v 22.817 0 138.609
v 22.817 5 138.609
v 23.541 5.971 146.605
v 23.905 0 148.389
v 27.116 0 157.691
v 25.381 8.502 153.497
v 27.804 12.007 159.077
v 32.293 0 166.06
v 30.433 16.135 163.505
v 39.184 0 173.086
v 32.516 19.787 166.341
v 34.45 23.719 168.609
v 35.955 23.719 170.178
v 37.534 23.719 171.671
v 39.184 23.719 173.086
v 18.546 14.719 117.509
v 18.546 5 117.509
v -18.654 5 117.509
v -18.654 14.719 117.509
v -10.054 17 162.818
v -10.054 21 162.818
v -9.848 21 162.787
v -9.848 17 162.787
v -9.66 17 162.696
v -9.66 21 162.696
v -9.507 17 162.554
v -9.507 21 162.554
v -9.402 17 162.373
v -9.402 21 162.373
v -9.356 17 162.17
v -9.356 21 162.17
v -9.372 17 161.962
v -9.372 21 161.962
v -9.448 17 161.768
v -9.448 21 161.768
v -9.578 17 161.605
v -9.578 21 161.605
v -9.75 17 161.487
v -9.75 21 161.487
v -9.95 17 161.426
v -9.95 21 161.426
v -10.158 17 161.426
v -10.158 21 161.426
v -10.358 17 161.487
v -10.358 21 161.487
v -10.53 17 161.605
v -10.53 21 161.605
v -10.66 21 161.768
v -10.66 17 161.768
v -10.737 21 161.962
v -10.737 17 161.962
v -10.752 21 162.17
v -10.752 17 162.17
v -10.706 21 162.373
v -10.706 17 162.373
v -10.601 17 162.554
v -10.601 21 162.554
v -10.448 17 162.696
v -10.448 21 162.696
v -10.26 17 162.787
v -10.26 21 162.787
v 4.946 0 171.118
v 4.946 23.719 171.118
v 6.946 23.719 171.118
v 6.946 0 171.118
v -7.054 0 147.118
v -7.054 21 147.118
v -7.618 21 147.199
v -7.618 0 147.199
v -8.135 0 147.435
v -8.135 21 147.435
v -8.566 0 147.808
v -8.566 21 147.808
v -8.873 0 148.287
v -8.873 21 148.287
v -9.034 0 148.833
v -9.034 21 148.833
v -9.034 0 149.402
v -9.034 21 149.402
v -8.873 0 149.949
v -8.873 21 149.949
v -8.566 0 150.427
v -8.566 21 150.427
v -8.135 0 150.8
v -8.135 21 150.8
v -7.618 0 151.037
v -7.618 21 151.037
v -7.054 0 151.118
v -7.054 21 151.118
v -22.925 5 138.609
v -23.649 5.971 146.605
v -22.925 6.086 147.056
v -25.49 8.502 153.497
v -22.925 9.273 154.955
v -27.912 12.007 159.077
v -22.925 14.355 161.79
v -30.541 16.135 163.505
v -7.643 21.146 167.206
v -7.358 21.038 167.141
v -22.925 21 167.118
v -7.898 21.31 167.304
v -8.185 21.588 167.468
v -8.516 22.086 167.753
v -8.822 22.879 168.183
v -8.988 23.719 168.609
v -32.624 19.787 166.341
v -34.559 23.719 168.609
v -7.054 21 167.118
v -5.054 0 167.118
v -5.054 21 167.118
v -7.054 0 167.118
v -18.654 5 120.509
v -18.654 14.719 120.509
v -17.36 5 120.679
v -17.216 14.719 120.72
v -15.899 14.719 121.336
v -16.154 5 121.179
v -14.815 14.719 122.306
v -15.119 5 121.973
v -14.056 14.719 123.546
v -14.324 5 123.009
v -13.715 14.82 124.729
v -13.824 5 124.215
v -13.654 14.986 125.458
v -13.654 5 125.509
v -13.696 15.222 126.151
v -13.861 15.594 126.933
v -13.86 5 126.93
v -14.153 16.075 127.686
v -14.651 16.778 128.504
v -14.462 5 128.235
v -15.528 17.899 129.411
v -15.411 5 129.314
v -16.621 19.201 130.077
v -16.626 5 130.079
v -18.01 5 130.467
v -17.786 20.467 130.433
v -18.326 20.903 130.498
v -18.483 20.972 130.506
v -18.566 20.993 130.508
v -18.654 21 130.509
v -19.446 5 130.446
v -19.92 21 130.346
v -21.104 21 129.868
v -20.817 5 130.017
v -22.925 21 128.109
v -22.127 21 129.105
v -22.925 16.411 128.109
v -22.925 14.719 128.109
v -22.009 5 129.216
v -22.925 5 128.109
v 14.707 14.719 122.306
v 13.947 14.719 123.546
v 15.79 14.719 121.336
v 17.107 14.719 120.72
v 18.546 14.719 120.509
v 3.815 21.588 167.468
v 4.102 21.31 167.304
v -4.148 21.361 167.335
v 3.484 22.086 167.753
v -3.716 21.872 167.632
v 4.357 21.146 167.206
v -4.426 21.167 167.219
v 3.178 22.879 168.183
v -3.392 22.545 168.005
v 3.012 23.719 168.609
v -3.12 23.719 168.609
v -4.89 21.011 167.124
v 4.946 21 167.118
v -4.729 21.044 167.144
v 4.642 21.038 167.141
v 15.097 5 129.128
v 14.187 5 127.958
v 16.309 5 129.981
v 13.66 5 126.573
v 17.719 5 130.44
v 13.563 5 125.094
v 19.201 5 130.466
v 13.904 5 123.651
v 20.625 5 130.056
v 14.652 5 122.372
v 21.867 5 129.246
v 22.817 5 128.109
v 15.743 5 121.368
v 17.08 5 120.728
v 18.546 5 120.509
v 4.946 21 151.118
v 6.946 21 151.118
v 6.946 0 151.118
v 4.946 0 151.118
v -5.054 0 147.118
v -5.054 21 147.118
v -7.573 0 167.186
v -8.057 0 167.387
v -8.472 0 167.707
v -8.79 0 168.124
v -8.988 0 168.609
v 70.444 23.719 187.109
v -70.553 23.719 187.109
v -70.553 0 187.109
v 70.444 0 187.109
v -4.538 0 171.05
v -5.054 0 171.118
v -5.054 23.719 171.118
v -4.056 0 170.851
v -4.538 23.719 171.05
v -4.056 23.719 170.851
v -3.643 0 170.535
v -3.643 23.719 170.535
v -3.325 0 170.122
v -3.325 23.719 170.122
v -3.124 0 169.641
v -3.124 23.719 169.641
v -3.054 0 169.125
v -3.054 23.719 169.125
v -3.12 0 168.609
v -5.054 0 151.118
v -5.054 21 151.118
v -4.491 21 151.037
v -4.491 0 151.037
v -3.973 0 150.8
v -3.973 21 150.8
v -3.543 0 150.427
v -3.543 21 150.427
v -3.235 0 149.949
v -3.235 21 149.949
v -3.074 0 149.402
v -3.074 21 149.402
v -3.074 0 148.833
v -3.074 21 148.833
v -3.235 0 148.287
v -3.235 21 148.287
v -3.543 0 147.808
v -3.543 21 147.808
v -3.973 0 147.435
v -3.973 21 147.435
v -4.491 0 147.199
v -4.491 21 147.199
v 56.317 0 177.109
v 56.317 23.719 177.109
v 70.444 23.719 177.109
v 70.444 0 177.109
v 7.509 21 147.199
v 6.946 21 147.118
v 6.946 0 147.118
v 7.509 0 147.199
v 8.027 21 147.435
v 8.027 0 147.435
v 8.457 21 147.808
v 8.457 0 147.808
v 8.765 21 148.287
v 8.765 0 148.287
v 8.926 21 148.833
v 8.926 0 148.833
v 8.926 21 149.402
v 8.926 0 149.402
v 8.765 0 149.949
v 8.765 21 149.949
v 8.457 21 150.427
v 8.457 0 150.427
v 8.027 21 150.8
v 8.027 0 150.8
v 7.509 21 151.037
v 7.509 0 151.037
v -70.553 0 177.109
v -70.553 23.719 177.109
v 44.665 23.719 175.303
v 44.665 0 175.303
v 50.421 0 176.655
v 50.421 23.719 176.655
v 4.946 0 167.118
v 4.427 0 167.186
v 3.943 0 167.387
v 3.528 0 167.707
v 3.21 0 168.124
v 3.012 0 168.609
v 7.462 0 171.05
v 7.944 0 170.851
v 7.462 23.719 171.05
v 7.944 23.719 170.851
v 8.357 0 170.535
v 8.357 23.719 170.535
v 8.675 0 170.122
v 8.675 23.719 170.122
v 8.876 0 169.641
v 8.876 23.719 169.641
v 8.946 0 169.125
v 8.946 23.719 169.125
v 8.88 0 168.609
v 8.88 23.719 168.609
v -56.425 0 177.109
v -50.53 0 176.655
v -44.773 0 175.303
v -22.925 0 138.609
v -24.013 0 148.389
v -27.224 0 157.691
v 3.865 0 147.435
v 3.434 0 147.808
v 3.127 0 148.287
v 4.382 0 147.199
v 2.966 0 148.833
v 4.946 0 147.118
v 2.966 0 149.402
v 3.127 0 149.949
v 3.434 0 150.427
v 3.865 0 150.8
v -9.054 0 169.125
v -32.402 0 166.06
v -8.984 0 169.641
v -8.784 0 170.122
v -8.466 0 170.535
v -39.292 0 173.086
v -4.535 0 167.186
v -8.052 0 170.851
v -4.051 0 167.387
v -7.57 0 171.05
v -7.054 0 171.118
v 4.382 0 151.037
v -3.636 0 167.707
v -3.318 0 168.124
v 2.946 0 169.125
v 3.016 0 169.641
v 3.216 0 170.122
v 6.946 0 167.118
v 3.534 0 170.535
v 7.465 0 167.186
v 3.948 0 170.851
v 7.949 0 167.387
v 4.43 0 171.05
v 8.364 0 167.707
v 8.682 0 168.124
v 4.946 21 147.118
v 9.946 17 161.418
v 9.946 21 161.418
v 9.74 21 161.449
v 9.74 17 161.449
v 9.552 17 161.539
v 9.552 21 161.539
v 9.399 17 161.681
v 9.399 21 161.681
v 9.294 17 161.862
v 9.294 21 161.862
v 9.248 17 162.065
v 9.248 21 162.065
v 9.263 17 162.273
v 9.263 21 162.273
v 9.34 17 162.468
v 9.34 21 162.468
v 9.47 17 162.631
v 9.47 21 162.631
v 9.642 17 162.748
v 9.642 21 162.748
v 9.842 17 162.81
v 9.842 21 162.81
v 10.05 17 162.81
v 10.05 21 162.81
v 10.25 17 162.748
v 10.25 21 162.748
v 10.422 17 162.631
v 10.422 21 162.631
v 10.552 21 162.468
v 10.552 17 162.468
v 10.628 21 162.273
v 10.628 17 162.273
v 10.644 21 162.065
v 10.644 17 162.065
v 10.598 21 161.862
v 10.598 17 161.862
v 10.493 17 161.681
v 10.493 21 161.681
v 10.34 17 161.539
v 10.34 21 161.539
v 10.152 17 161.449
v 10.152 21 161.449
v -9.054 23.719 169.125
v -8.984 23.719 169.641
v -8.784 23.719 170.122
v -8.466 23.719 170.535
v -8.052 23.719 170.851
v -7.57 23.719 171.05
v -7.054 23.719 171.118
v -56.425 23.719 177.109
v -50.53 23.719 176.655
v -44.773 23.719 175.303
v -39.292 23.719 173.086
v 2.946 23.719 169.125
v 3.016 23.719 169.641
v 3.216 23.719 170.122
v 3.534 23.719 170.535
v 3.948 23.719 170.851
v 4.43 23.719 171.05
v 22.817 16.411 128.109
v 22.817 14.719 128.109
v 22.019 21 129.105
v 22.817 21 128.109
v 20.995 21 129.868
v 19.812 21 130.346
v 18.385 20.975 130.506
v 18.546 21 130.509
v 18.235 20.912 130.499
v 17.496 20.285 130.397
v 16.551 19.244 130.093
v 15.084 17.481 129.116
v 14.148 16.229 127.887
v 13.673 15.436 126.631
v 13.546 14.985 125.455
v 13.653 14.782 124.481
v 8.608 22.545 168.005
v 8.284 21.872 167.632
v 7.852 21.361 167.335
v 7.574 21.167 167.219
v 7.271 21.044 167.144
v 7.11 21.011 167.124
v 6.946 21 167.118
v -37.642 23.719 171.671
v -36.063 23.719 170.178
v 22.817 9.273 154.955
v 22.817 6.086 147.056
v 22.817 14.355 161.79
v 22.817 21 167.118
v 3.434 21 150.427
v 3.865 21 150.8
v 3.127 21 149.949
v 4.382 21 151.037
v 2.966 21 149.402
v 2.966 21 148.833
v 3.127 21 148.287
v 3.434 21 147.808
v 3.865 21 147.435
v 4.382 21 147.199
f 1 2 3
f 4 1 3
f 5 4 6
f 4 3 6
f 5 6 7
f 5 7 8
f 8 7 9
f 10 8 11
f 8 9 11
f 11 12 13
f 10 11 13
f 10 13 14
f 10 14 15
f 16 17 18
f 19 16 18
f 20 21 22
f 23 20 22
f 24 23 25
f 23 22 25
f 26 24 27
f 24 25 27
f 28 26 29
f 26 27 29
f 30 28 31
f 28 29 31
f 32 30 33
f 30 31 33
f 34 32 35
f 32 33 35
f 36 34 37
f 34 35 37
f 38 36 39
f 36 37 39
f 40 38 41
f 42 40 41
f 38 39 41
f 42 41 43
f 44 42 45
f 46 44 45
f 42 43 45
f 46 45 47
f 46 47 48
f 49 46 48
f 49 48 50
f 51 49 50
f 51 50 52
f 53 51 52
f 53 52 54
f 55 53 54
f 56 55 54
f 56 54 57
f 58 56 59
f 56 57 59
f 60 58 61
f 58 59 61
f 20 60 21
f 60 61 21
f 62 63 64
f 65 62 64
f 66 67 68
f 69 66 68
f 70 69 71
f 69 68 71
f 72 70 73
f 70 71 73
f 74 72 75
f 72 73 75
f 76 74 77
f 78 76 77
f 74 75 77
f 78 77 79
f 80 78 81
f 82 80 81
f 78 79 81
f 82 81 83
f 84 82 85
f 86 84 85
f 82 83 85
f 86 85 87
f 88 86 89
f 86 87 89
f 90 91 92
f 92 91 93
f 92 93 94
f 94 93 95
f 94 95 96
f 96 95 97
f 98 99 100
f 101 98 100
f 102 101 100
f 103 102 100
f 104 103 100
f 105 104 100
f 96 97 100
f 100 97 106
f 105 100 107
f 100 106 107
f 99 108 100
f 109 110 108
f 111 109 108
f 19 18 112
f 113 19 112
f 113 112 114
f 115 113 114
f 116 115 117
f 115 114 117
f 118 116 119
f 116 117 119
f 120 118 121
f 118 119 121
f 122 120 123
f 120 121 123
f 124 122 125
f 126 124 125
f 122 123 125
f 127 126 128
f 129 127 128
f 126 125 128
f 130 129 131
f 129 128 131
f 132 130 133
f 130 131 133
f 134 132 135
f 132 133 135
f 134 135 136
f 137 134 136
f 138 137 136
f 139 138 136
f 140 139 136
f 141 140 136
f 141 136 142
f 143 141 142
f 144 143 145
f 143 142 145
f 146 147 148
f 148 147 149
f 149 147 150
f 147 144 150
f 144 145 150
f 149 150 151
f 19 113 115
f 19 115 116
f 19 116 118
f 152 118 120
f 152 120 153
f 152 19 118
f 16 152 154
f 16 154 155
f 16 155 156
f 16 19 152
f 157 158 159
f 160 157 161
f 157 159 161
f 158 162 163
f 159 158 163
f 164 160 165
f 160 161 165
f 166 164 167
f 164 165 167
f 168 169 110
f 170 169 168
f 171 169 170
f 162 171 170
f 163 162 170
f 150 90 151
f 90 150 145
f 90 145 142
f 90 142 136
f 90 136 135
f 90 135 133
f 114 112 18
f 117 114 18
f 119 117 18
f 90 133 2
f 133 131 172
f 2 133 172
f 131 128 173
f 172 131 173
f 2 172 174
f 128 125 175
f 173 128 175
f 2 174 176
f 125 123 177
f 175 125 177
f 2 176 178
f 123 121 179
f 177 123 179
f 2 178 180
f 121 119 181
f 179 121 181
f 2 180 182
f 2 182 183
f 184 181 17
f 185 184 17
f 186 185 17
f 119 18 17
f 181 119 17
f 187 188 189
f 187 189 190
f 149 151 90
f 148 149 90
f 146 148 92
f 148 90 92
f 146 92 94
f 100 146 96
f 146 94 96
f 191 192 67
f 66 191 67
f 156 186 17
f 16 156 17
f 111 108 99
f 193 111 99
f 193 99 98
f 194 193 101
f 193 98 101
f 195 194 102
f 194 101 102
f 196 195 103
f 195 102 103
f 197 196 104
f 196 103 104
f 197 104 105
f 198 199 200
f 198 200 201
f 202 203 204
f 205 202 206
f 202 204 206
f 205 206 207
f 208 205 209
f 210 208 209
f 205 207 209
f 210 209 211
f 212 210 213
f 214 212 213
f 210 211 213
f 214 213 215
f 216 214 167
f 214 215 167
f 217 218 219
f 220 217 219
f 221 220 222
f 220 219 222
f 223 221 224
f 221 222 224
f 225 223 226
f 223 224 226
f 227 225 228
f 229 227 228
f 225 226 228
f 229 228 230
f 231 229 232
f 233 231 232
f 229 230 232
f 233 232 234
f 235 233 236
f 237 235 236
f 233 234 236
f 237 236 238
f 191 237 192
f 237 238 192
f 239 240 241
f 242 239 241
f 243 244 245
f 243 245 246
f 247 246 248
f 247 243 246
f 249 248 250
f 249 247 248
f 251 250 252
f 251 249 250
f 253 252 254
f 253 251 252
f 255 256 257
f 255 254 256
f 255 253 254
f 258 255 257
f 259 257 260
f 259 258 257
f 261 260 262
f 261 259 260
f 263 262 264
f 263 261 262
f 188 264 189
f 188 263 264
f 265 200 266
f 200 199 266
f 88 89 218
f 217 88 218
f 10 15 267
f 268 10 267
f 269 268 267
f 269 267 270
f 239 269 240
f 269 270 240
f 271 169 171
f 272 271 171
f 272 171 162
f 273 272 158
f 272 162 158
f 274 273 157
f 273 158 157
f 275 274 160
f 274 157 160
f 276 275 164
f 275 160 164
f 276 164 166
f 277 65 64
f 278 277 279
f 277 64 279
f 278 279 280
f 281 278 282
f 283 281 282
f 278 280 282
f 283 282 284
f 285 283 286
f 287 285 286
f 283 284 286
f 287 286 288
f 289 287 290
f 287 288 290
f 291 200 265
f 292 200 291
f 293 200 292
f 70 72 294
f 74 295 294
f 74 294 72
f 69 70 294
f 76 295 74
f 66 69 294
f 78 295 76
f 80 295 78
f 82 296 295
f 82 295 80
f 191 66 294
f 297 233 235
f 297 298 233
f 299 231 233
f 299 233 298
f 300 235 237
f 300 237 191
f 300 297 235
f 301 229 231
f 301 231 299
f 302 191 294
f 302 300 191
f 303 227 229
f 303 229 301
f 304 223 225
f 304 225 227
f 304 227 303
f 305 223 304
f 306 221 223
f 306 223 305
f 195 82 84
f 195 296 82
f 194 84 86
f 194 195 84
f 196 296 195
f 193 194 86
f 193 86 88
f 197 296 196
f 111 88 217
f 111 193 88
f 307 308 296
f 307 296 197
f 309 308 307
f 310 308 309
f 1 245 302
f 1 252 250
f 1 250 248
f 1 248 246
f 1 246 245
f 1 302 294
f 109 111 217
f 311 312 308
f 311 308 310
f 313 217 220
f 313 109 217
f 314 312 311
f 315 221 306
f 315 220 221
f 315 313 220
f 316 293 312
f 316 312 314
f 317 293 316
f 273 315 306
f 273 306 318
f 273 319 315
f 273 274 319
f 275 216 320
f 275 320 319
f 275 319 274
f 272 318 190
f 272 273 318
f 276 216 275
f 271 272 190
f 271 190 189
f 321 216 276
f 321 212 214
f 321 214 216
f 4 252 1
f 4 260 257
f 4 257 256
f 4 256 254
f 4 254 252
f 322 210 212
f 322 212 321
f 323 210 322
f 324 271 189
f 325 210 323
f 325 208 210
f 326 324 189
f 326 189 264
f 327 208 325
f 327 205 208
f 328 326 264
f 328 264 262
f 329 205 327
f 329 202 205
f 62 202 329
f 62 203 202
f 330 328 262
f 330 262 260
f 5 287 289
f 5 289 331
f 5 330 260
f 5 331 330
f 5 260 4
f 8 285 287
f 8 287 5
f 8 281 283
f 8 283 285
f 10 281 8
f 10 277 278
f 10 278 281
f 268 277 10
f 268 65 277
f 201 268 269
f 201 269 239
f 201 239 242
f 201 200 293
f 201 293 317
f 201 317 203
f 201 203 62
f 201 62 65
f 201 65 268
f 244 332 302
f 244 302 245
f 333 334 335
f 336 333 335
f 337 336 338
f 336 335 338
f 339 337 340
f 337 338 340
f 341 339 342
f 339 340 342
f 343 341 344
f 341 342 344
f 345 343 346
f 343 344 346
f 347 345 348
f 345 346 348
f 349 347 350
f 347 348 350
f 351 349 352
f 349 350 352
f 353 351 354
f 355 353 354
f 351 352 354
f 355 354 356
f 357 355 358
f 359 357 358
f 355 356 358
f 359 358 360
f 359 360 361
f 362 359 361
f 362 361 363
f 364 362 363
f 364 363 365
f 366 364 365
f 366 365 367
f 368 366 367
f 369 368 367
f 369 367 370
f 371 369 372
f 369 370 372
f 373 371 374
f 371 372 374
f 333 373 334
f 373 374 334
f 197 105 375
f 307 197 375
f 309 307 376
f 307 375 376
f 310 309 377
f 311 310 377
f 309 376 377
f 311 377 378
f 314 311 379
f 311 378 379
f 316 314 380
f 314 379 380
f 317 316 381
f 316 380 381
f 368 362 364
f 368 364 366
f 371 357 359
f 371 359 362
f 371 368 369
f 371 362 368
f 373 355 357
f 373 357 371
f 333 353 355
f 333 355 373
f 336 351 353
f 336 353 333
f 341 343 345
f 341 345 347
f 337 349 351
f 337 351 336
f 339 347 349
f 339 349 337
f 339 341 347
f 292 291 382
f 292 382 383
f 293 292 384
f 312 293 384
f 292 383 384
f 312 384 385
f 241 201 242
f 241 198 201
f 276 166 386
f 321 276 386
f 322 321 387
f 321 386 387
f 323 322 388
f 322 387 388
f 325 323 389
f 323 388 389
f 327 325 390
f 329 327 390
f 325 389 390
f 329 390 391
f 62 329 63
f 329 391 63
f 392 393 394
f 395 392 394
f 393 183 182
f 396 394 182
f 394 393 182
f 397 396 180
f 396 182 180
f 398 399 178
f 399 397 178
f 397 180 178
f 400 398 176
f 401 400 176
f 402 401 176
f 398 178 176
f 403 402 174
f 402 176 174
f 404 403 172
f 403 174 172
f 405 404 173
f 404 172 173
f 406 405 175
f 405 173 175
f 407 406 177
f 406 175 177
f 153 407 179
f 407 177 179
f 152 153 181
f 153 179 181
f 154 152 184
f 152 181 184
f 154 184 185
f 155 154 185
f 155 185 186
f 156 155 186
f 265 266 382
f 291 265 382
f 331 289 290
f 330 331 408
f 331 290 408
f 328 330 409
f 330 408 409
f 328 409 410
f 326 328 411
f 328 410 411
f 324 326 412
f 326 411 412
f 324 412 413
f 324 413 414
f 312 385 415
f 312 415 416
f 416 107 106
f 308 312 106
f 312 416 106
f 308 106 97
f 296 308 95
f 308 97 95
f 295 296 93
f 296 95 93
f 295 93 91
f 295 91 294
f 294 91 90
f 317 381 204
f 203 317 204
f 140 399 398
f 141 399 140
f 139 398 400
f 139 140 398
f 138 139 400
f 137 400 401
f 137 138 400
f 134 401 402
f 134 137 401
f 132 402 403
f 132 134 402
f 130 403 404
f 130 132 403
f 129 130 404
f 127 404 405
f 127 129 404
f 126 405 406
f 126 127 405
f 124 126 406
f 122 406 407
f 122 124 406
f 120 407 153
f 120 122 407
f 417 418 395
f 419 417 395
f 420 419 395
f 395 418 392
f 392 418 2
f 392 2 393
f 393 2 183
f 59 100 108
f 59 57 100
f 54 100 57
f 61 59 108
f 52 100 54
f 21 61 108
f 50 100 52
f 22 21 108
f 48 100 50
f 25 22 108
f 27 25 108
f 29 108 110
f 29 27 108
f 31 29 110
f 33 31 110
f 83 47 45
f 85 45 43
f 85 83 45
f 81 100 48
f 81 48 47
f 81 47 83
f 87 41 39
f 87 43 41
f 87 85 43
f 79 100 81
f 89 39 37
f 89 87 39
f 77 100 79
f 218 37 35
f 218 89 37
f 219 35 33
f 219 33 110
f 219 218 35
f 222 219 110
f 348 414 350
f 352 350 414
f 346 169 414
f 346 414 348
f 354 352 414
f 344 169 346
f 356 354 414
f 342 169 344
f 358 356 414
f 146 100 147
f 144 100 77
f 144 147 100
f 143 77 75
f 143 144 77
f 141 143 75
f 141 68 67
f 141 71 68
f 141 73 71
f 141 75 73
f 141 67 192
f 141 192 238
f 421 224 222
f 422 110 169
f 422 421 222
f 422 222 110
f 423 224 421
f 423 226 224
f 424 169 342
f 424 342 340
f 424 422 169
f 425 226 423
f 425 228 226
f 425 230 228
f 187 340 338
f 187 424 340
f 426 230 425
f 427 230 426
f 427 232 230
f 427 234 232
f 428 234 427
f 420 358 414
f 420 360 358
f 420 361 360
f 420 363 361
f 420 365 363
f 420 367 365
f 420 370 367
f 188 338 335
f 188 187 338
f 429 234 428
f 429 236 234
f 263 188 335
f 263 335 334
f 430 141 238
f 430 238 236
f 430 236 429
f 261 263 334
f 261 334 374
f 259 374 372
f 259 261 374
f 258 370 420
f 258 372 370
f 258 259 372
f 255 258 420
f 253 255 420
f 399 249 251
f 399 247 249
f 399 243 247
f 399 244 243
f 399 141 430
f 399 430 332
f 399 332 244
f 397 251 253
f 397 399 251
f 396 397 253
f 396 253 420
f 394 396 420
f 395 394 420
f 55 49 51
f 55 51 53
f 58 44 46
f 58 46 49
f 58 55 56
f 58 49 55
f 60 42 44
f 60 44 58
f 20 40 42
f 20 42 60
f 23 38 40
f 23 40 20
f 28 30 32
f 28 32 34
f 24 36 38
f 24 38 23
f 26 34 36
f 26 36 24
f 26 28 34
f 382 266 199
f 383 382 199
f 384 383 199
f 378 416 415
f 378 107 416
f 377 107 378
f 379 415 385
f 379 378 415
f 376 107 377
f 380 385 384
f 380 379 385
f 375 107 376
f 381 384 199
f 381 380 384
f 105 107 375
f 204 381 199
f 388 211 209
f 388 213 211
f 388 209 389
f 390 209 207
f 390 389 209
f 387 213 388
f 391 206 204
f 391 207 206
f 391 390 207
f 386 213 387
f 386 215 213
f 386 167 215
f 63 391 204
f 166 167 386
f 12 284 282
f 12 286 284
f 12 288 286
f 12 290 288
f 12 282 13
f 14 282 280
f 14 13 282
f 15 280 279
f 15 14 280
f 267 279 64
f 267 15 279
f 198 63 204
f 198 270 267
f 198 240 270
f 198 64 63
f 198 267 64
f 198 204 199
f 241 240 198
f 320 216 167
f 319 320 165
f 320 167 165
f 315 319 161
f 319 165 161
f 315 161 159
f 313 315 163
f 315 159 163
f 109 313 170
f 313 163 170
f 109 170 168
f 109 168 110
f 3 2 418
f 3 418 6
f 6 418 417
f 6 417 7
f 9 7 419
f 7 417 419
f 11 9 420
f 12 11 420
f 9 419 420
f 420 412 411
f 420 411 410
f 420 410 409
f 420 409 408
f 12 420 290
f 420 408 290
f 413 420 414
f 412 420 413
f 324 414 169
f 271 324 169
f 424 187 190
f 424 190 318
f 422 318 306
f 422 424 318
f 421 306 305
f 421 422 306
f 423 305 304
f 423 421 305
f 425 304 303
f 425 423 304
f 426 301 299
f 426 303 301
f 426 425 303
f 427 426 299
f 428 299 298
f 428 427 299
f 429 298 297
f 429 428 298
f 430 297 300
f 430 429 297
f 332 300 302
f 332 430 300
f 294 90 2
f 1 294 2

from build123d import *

# Parameters (mm, degrees)
SKETCH2_W                       = 140.99708831
SKETCH2_H                       = 23.719356628
BOSS_EXTRUDE1_DEPTH             = 40
CUT_EXTRUDE1_DEPTH              = 229.787753821
BOSS_EXTRUDE2_DEPTH             = 16
CUT_EXTRUDE2_START              = -9
CUT_EXTRUDE2_DEPTH              = 9
FILLET1_R                       = 7
CUT_EXTRUDE3_DEPTH              = 194.183131235
CUT_EXTRUDE3_DEPTH_BACK         = 194.183131235
CUT_EXTRUDE4_DEPTH              = 194.497622924
BOSS_EXTRUDE4_REACH             = 195.183
SKETCH11_W                      = 140.99708831
SKETCH11_H                      = 8.5
BOSS_EXTRUDE4_DIRECTION_2_REACH = 195.183
SKETCH14_R                      = 0.7
CUT_EXTRUDE6_DEPTH              = 4
CUT_EXTRUDE7_DEPTH              = 202.370124673


with BuildPart() as part:
    # Sketch2 → Boss-Extrude1 (new body)
    with BuildSketch(Plane.XY.offset(138.608649029)):
        with Locations((-0.054079367, 11.859678314)):
            Rectangle(SKETCH2_W, SKETCH2_H)
    extrude(amount=BOSS_EXTRUDE1_DEPTH)

    # Sketch3 → Cut-Extrude1 (cut, through all)
    with BuildSketch(Plane.ZY.offset(70.552623522)):
        with BuildLine():
            Line((168.608649029, 23.719356628), (158.608649029, 23.719356628))
            Line((158.608649029, 23.719356628), (138.608649029, 23.719356628))
            Line((138.608649029, 23.719356628), (138.608649029, 5))
            ThreePointArc((138.608649029, 5), (156.289247948, 10.063699068), (168.608649029, 23.719356628))
        make_face()
    extrude(amount=-CUT_EXTRUDE1_DEPTH, mode=Mode.SUBTRACT)

    # Sketch4 → Boss-Extrude2 (add)
    with BuildSketch(Plane(origin=(0, 5, 0), x_dir=(1, 0, 0), z_dir=(0, 1, 0))):
        with BuildLine():
            Line((-22.924910668, -128.108649029), (-22.924910668, -168.608649029))
            Line((-22.924910668, -168.608649029), (-0.054079367, -168.608649029))
            Line((-0.054079367, -168.608649029), (22.816751934, -168.608649029))
            Line((22.816751934, -168.608649029), (22.816751934, -128.108649029))
            ThreePointArc((22.816751934, -128.108649029), (14.187021689, -127.958138772), (18.545920633, -120.508649029))
            Line((18.545920633, -120.508649029), (18.545920633, -117.508649029))
            Line((18.545920633, -117.508649029), (-18.654079367, -117.508649029))
            Line((-18.654079367, -117.508649029), (-18.654079367, -120.508649029))
            ThreePointArc((-18.654079367, -120.508649029), (-15.118545461, -121.973115123), (-13.654079367, -125.508649029))
            ThreePointArc((-13.654079367, -125.508649029), (-17.303923173, -130.322906838), (-22.924910668, -128.108649029))
        make_face()
    extrude(amount=BOSS_EXTRUDE2_DEPTH)

    # Sketch6 → Cut-Extrude2 (cut)
    with BuildSketch(Plane(origin=(0, 23.719356628, 0), x_dir=(1, 0, 0), z_dir=(0, 1, 0)).offset(CUT_EXTRUDE2_START)):
        with BuildLine():
            ThreePointArc((-18.654079367, -120.508649029), (-13.654079367, -125.508649029), (-18.654079367, -130.508649029))
            Line((-18.654079367, -130.508649029), (18.545920633, -130.508649029))
            ThreePointArc((18.545920633, -130.508649029), (13.545920633, -125.508649029), (18.545920633, -120.508649029))
            Line((18.545920633, -120.508649029), (18.545920633, -117.508649029))
            Line((18.545920633, -117.508649029), (-18.654079367, -117.508649029))
            Line((-18.654079367, -117.508649029), (-18.654079367, -120.508649029))
        make_face()
    extrude(amount=CUT_EXTRUDE2_DEPTH, mode=Mode.SUBTRACT)

    # Fillet1
    # the kernel refuses this fillet: 7 mm, written as the material it adds along each edge
    with BuildSketch(Plane(origin=(-36.061428038, 14.719356628, 130.508649029), x_dir=(0, 1, 0), z_dir=(1, 0, 0))) as fillet1_piece_1_section:
        with BuildLine():
            CenterArc((7, -6.962939469), FILLET1_R, 95.898427251, 84.101572749)
            Line((0, -6.962939469), (0, 0))
            Line((0, 0), (6.280643372, 0))
        make_face()
    fillet1_piece_1 = extrude(amount=72.014697343, mode=Mode.PRIVATE)
    fillet1_piece_1 = split(fillet1_piece_1, bisect_by=Plane(origin=(22.816751934, 16.511100944, 128.243610021), z_dir=(-1, 0, 0)), keep=Keep.TOP, mode=Mode.PRIVATE)
    fillet1_piece_1 = split(fillet1_piece_1, bisect_by=Plane(origin=(-22.924910668, 16.511100944, 128.243610021), z_dir=(1, 0, 0)), keep=Keep.TOP, mode=Mode.PRIVATE)
    fillet1_piece_1 = fillet1_piece_1 - Plane(origin=(18.545920633, 16.511100944, 125.508649029), x_dir=(0.854166260162501, 0, 0.5200000000000065), z_dir=(0, -1, 0)) * Cylinder(5, 172, mode=Mode.PRIVATE)
    fillet1_piece_1 = fillet1_piece_1 - Plane(origin=(-18.654079367, 16.511100944, 125.508649029), x_dir=(0, 0, -1), z_dir=(0, -1, 0)) * Cylinder(5, 172, mode=Mode.PRIVATE)
    add(fillet1_piece_1)

    # Sketch10 → Cut-Extrude3 (cut, two sides: drawn at the far end of the back side and taken through both)
    with BuildSketch(Plane(origin=(0, 21, 0), x_dir=(1, 0, 0), z_dir=(0, 1, 0)).offset(-CUT_EXTRUDE3_DEPTH_BACK)):
        with BuildLine():
            Line((-70.552623522, -168.608649029), (-70.552623522, -172.108649029))
            Line((-70.552623522, -172.108649029), (-56.424910668, -172.108649029))
            ThreePointArc((-56.424910668, -172.108649029), (-32.736833498, -162.296726199), (-22.924910668, -138.608649029))
            Line((-22.924910668, -138.608649029), (-70.552623522, -138.608649029))
            Line((-70.552623522, -138.608649029), (-70.552623522, -168.608649029))
        make_face()
        with BuildLine():
            ThreePointArc((22.816751934, -138.608649029), (32.628674764, -162.296726199), (56.316751934, -172.108649029))
            Line((56.316751934, -172.108649029), (70.444464788, -172.108649029))
            Line((70.444464788, -172.108649029), (70.444464788, -168.608649029))
            Line((70.444464788, -168.608649029), (70.444464788, -138.608649029))
            Line((70.444464788, -138.608649029), (22.816751934, -138.608649029))
        make_face()
    extrude(amount=CUT_EXTRUDE3_DEPTH + CUT_EXTRUDE3_DEPTH_BACK, mode=Mode.SUBTRACT)

    # Sketch12 → Cut-Extrude4 (cut, through all)
    with BuildSketch(Plane(origin=(0, 23.719356628, 0), x_dir=(1, 0, 0), z_dir=(0, 1, 0))):
        with BuildLine():
            ThreePointArc((39.183618102, -173.086260969), (47.517265008, -176.089564571), (56.316751934, -177.108649029))
            Line((56.316751934, -177.108649029), (70.444464788, -177.108649029))
            Line((70.444464788, -177.108649029), (70.444464788, -172.108649029))
            Line((70.444464788, -172.108649029), (56.316751934, -172.108649029))
            ThreePointArc((56.316751934, -172.108649029), (32.628674764, -162.296726199), (22.816751934, -138.608649029))
            ThreePointArc((22.816751934, -138.608649029), (27.116175744, -157.691232929), (39.183618102, -173.086260969))
        make_face()
        with BuildLine():
            Line((-70.552623522, -172.108649029), (-70.552623522, -177.108649029))
            Line((-70.552623522, -177.108649029), (-56.424910668, -177.108649029))
            ThreePointArc((-56.424910668, -177.108649029), (-47.625423742, -176.089564571), (-39.291776836, -173.086260969))
            ThreePointArc((-39.291776836, -173.086260969), (-27.224334478, -157.691232929), (-22.924910668, -138.608649029))
            ThreePointArc((-22.924910668, -138.608649029), (-32.736833498, -162.296726199), (-56.424910668, -172.108649029))
            Line((-56.424910668, -172.108649029), (-70.552623522, -172.108649029))
        make_face()
    extrude(amount=-CUT_EXTRUDE4_DEPTH, mode=Mode.SUBTRACT)

    # Boss-Extrude4: up to this face of the body (flat: up to its plane)
    boss_extrude4_end = Plane(part.part.faces().sort_by_distance((-0.054079367, 23.719356628, 174.251451193))[0])
    # Sketch11 → Boss-Extrude4 (add, up to the picked face)
    with BuildSketch(Plane(origin=(0, 21, 0), x_dir=(1, 0, 0), z_dir=(0, 1, 0)), mode=Mode.PRIVATE) as boss_extrude4_sk1:
        with Locations((-0.054079367, -182.858649029)):
            Rectangle(SKETCH11_W, SKETCH11_H)
    boss_extrude4_tool1 = split(extrude(boss_extrude4_sk1.sketch, amount=BOSS_EXTRUDE4_REACH, mode=Mode.PRIVATE), bisect_by=boss_extrude4_end, keep=Keep.BOTH, mode=Mode.PRIVATE)
    add(boss_extrude4_tool1.solids().sort_by(Axis((-0.054079, 21, 182.858649), (0, 1, 0)))[0])

    # Boss-Extrude4 direction 2: up to this face of the body (flat: up to its plane)
    boss_extrude4_direction_2_end = Plane(part.part.faces().sort_by_distance((-0.054079367, 0, 161.750198619))[0])
    # Sketch11 → Boss-Extrude4 direction 2 (add, up to the picked face)
    with BuildSketch(Plane(origin=(0, 21, 0), x_dir=(1, 0, 0), z_dir=(0, 1, 0)), mode=Mode.PRIVATE) as boss_extrude4_direction_2_sk1:
        with Locations((-0.054079367, -182.858649029)):
            Rectangle(SKETCH11_W, SKETCH11_H)
    boss_extrude4_direction_2_tool1 = split(extrude(boss_extrude4_direction_2_sk1.sketch, amount=-BOSS_EXTRUDE4_DIRECTION_2_REACH, mode=Mode.PRIVATE), bisect_by=boss_extrude4_direction_2_end, keep=Keep.BOTH, mode=Mode.PRIVATE)
    add(boss_extrude4_direction_2_tool1.solids().sort_by(Axis((-0.054079, 21, 182.858649), (0, -1, 0)))[0])

    # Sketch14 → Cut-Extrude6 (cut)
    with BuildSketch(Plane(origin=(0, 21, 0), x_dir=(1, 0, 0), z_dir=(0, 1, 0))):
        with Locations(Location((-10.054079367, -162.11771624, 0), (0, 0, 270))):
            Circle(SKETCH14_R)
        with Locations(Location((9.945920633, -162.11771624, 0), (0, 0, 90))):
            Circle(SKETCH14_R)
    extrude(amount=-CUT_EXTRUDE6_DEPTH, mode=Mode.SUBTRACT)

    # Sketch16 → Cut-Extrude7 (cut, through all)
    with BuildSketch(Plane(origin=(0, 23.719356628, 0), x_dir=(1, 0, 0), z_dir=(0, 1, 0))):
        with BuildLine():
            Line((-7.054079367, -151.11771624), (-5.054079367, -151.11771624))
            ThreePointArc((-5.054079367, -151.11771624), (-3.054079367, -149.11771624), (-5.054079367, -147.11771624))
            Line((-5.054079367, -147.11771624), (-7.054079367, -147.11771624))
            ThreePointArc((-7.054079367, -147.11771624), (-9.054079367, -149.11771624), (-7.054079367, -151.11771624))
        make_face()
        with BuildLine():
            ThreePointArc((4.945920633, -151.11771624), (2.945920633, -149.11771624), (4.945920633, -147.11771624))
            Line((4.945920633, -147.11771624), (6.945920633, -147.11771624))
            ThreePointArc((6.945920633, -147.11771624), (8.945920633, -149.11771624), (6.945920633, -151.11771624))
            Line((6.945920633, -151.11771624), (4.945920633, -151.11771624))
        make_face()
        with BuildLine():
            Line((4.945920633, -171.11771624), (6.945920633, -171.11771624))
            ThreePointArc((6.945920633, -171.11771624), (8.529924172, -170.338753827), (8.880048492, -168.608649029))
            Line((8.880048492, -168.608649029), (3.011792774, -168.608649029))
            ThreePointArc((3.011792774, -168.608649029), (3.361917094, -170.338753827), (4.945920633, -171.11771624))
        make_face()
        with BuildLine():
            Line((3.011792774, -168.608649029), (8.880048492, -168.608649029))
            ThreePointArc((8.880048492, -168.608649029), (8.16695822, -167.533712701), (6.945920633, -167.11771624))
            Line((6.945920633, -167.11771624), (4.945920633, -167.11771624))
            ThreePointArc((4.945920633, -167.11771624), (3.724883046, -167.533712701), (3.011792774, -168.608649029))
        make_face()
        with BuildLine():
            Line((-8.988207226, -168.608649029), (-3.119951508, -168.608649029))
            ThreePointArc((-3.119951508, -168.608649029), (-3.83304178, -167.533712701), (-5.054079367, -167.11771624))
            Line((-5.054079367, -167.11771624), (-7.054079367, -167.11771624))
            ThreePointArc((-7.054079367, -167.11771624), (-8.275116954, -167.533712701), (-8.988207226, -168.608649029))
        make_face()
        with BuildLine():
            ThreePointArc((-5.054079367, -171.11771624), (-3.470075828, -170.338753827), (-3.119951508, -168.608649029))
            Line((-3.119951508, -168.608649029), (-8.988207226, -168.608649029))
            ThreePointArc((-8.988207226, -168.608649029), (-8.638082906, -170.338753827), (-7.054079367, -171.11771624))
            Line((-7.054079367, -171.11771624), (-5.054079367, -171.11771624))
        make_face()
    extrude(amount=-CUT_EXTRUDE7_DEPTH, mode=Mode.SUBTRACT)


solid = part.part
